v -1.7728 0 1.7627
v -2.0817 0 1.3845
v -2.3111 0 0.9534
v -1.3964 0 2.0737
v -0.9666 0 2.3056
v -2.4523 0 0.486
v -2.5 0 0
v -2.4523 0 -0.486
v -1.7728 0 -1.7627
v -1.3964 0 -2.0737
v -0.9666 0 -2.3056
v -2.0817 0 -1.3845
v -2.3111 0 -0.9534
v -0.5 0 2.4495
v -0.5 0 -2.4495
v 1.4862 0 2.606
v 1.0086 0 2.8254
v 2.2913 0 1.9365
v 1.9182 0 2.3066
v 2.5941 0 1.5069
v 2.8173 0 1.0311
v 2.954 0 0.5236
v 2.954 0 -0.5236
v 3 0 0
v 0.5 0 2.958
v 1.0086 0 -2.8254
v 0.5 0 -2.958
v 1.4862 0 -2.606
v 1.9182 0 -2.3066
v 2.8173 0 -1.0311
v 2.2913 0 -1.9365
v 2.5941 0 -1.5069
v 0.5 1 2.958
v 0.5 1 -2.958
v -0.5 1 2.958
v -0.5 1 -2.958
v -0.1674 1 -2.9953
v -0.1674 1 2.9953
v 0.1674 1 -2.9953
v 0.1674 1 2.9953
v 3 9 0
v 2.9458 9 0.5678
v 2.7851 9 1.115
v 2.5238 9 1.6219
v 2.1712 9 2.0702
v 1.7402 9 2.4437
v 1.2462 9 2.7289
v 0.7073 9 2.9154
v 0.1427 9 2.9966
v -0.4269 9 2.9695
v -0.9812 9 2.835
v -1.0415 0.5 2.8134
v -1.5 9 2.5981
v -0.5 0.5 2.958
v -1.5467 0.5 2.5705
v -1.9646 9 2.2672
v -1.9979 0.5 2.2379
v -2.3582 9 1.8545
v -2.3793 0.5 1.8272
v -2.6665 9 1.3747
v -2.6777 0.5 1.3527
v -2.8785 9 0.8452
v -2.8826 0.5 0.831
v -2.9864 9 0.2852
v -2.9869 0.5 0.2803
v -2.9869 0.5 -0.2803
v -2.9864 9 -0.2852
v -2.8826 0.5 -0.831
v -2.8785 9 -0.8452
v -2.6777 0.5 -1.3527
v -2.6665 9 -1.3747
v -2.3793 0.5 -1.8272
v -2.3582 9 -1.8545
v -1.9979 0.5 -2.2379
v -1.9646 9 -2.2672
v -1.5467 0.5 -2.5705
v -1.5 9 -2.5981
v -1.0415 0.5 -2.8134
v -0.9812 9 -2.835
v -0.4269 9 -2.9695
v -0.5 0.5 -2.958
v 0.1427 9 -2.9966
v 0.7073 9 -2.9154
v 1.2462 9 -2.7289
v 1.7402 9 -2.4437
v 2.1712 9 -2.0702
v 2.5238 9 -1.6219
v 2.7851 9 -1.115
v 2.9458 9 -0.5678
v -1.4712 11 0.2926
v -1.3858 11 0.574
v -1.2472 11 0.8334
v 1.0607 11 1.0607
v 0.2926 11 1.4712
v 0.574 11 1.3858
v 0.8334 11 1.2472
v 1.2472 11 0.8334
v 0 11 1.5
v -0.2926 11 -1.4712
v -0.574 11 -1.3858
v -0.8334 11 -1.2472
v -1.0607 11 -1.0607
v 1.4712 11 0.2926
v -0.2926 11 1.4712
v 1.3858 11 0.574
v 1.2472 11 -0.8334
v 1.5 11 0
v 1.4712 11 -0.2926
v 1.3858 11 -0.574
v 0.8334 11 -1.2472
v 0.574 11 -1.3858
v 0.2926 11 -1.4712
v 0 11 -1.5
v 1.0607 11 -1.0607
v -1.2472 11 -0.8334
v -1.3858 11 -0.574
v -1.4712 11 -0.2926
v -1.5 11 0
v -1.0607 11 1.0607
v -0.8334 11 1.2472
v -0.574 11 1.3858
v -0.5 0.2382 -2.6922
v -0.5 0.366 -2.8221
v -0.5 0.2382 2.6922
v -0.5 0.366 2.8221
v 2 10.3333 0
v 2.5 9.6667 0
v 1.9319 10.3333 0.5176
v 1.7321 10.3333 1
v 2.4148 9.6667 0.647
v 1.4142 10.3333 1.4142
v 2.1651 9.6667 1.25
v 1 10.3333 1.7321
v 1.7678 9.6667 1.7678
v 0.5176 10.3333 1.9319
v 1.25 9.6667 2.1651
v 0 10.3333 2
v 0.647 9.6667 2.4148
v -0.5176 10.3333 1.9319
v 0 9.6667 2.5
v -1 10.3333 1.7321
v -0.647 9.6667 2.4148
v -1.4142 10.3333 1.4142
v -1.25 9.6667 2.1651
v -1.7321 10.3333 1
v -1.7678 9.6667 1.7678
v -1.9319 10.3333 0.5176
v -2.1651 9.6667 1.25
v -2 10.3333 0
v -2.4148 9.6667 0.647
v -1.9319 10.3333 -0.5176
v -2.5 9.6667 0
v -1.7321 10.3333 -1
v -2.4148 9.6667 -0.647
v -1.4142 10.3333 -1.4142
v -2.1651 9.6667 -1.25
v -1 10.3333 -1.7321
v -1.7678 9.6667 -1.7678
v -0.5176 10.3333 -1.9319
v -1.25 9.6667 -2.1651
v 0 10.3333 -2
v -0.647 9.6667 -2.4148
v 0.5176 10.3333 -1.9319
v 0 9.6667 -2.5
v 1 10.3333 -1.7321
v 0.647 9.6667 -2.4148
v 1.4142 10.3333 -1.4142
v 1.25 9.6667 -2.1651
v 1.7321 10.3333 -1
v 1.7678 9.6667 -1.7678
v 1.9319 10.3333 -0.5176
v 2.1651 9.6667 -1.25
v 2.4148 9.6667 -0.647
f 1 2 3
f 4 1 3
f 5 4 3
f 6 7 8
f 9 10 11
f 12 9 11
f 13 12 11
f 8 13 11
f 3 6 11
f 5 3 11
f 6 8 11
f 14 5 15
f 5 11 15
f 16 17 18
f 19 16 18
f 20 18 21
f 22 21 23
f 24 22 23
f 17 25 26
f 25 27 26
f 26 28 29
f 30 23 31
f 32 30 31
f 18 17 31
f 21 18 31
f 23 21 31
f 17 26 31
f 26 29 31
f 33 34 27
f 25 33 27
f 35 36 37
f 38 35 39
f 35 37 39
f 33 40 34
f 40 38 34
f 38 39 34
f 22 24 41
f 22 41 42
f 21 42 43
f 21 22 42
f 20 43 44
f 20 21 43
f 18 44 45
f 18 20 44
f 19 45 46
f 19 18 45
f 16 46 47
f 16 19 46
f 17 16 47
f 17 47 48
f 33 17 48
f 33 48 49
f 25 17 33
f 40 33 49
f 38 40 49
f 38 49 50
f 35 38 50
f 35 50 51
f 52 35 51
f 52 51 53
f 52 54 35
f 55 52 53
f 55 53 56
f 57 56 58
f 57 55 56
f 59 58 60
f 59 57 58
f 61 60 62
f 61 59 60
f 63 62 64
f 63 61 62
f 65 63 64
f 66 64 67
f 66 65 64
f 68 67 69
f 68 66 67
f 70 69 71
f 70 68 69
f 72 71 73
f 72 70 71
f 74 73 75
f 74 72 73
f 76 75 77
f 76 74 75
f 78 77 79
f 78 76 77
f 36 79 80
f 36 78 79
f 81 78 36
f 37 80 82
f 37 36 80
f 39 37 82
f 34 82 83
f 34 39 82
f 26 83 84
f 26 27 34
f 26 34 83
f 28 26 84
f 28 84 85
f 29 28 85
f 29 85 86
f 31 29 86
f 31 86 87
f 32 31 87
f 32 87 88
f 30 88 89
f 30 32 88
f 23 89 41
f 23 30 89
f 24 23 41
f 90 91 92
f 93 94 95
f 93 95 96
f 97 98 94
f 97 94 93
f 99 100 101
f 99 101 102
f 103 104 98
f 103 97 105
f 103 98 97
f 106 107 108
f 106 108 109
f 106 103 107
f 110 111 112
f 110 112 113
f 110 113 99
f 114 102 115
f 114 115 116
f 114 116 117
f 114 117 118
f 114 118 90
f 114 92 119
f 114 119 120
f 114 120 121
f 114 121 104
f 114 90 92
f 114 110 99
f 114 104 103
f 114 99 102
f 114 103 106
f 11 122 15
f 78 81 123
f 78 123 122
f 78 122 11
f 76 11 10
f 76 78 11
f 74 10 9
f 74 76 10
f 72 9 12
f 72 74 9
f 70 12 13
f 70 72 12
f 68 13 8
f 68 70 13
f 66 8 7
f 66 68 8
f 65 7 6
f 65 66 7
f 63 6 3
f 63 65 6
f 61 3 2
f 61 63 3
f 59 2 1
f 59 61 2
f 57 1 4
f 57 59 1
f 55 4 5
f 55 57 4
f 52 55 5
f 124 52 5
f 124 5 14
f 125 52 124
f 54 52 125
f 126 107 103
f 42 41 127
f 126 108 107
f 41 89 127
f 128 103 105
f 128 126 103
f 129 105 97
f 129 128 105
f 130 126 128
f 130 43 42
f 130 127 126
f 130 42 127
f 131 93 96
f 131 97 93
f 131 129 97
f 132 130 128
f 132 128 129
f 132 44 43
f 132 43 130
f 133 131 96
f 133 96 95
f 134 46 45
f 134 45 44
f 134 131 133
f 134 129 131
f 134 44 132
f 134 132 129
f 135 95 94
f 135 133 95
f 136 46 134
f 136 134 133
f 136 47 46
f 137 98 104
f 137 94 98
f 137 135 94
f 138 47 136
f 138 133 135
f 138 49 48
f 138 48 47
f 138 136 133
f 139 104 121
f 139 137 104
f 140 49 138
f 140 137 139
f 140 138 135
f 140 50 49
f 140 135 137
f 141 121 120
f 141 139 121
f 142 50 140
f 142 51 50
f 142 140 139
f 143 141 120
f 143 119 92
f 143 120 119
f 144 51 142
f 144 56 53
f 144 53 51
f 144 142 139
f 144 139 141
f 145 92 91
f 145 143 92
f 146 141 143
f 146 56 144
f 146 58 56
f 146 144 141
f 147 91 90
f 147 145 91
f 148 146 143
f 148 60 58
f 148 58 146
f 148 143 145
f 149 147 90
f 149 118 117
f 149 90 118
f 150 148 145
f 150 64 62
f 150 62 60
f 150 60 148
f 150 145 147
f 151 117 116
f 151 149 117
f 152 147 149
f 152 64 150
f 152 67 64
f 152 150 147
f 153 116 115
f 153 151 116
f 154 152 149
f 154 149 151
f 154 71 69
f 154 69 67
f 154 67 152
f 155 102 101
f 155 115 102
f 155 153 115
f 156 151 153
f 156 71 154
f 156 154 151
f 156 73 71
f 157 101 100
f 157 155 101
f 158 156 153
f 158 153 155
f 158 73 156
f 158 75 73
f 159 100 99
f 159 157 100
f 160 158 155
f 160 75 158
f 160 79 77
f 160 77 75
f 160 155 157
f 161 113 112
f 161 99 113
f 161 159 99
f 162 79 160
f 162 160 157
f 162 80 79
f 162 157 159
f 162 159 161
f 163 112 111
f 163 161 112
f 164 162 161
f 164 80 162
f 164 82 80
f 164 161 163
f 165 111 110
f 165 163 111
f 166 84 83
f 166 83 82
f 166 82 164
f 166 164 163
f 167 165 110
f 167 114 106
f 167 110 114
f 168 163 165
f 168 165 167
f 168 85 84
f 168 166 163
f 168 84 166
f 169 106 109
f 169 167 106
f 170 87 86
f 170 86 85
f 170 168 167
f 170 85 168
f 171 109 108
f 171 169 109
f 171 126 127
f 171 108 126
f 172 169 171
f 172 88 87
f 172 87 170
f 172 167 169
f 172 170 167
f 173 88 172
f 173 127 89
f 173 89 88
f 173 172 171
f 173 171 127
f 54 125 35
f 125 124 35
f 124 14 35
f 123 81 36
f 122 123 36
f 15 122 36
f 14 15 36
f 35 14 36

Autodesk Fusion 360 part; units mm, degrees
sketch "Sketch1" plane through (0, 0, 0) normal (0, 0, 1) x (1, 0, 0)
  line L0 (0, 0) -> (0, 11)
  line L1 (0, 11) -> (1.5, 11)
  line L2 (1.5, 11) -> (3, 9)
  line L3 (3, 9) -> (3, 0)
  line L4 (3, 0) -> (0, 0)
  dimension "d1" = 9
  dimension "d2" = 11
  dimension "d3" = 1.5
  dimension "d4" = 3
revolve "Revolve1" add sketch "Sketch1" angle 360 about axis through (0, 0, 0) along (0, 1, 0)
sketch "Sketch2" plane through (0, 0, 0) normal (0, 0, 1) x (1, 0, 0)
  line L0 (0.5, -1) -> (-0.5, -1)
  line L1 (-0.5, -1) -> (-0.5, 1)
  line L2 (-0.5, 1) -> (0.5, 1)
  line L3 (0.5, 1) -> (0.5, -1)
  line L4 (0.5, -1) -> (-0.5, 1) construction
  line L5 (-0.5, -1) -> (0.5, 1) construction
  dimension "d6" = 1
  dimension "d7" = 2
extrude "Extrude1" cut sketch "Sketch2" along normal through all and the other way through all
chamfer "Chamfer1" distance 0.5 angle 45 2 edges at (3, 0, 0) (-3, 0, 0)
thread "Thread1" thread offset 0 thread length 10
